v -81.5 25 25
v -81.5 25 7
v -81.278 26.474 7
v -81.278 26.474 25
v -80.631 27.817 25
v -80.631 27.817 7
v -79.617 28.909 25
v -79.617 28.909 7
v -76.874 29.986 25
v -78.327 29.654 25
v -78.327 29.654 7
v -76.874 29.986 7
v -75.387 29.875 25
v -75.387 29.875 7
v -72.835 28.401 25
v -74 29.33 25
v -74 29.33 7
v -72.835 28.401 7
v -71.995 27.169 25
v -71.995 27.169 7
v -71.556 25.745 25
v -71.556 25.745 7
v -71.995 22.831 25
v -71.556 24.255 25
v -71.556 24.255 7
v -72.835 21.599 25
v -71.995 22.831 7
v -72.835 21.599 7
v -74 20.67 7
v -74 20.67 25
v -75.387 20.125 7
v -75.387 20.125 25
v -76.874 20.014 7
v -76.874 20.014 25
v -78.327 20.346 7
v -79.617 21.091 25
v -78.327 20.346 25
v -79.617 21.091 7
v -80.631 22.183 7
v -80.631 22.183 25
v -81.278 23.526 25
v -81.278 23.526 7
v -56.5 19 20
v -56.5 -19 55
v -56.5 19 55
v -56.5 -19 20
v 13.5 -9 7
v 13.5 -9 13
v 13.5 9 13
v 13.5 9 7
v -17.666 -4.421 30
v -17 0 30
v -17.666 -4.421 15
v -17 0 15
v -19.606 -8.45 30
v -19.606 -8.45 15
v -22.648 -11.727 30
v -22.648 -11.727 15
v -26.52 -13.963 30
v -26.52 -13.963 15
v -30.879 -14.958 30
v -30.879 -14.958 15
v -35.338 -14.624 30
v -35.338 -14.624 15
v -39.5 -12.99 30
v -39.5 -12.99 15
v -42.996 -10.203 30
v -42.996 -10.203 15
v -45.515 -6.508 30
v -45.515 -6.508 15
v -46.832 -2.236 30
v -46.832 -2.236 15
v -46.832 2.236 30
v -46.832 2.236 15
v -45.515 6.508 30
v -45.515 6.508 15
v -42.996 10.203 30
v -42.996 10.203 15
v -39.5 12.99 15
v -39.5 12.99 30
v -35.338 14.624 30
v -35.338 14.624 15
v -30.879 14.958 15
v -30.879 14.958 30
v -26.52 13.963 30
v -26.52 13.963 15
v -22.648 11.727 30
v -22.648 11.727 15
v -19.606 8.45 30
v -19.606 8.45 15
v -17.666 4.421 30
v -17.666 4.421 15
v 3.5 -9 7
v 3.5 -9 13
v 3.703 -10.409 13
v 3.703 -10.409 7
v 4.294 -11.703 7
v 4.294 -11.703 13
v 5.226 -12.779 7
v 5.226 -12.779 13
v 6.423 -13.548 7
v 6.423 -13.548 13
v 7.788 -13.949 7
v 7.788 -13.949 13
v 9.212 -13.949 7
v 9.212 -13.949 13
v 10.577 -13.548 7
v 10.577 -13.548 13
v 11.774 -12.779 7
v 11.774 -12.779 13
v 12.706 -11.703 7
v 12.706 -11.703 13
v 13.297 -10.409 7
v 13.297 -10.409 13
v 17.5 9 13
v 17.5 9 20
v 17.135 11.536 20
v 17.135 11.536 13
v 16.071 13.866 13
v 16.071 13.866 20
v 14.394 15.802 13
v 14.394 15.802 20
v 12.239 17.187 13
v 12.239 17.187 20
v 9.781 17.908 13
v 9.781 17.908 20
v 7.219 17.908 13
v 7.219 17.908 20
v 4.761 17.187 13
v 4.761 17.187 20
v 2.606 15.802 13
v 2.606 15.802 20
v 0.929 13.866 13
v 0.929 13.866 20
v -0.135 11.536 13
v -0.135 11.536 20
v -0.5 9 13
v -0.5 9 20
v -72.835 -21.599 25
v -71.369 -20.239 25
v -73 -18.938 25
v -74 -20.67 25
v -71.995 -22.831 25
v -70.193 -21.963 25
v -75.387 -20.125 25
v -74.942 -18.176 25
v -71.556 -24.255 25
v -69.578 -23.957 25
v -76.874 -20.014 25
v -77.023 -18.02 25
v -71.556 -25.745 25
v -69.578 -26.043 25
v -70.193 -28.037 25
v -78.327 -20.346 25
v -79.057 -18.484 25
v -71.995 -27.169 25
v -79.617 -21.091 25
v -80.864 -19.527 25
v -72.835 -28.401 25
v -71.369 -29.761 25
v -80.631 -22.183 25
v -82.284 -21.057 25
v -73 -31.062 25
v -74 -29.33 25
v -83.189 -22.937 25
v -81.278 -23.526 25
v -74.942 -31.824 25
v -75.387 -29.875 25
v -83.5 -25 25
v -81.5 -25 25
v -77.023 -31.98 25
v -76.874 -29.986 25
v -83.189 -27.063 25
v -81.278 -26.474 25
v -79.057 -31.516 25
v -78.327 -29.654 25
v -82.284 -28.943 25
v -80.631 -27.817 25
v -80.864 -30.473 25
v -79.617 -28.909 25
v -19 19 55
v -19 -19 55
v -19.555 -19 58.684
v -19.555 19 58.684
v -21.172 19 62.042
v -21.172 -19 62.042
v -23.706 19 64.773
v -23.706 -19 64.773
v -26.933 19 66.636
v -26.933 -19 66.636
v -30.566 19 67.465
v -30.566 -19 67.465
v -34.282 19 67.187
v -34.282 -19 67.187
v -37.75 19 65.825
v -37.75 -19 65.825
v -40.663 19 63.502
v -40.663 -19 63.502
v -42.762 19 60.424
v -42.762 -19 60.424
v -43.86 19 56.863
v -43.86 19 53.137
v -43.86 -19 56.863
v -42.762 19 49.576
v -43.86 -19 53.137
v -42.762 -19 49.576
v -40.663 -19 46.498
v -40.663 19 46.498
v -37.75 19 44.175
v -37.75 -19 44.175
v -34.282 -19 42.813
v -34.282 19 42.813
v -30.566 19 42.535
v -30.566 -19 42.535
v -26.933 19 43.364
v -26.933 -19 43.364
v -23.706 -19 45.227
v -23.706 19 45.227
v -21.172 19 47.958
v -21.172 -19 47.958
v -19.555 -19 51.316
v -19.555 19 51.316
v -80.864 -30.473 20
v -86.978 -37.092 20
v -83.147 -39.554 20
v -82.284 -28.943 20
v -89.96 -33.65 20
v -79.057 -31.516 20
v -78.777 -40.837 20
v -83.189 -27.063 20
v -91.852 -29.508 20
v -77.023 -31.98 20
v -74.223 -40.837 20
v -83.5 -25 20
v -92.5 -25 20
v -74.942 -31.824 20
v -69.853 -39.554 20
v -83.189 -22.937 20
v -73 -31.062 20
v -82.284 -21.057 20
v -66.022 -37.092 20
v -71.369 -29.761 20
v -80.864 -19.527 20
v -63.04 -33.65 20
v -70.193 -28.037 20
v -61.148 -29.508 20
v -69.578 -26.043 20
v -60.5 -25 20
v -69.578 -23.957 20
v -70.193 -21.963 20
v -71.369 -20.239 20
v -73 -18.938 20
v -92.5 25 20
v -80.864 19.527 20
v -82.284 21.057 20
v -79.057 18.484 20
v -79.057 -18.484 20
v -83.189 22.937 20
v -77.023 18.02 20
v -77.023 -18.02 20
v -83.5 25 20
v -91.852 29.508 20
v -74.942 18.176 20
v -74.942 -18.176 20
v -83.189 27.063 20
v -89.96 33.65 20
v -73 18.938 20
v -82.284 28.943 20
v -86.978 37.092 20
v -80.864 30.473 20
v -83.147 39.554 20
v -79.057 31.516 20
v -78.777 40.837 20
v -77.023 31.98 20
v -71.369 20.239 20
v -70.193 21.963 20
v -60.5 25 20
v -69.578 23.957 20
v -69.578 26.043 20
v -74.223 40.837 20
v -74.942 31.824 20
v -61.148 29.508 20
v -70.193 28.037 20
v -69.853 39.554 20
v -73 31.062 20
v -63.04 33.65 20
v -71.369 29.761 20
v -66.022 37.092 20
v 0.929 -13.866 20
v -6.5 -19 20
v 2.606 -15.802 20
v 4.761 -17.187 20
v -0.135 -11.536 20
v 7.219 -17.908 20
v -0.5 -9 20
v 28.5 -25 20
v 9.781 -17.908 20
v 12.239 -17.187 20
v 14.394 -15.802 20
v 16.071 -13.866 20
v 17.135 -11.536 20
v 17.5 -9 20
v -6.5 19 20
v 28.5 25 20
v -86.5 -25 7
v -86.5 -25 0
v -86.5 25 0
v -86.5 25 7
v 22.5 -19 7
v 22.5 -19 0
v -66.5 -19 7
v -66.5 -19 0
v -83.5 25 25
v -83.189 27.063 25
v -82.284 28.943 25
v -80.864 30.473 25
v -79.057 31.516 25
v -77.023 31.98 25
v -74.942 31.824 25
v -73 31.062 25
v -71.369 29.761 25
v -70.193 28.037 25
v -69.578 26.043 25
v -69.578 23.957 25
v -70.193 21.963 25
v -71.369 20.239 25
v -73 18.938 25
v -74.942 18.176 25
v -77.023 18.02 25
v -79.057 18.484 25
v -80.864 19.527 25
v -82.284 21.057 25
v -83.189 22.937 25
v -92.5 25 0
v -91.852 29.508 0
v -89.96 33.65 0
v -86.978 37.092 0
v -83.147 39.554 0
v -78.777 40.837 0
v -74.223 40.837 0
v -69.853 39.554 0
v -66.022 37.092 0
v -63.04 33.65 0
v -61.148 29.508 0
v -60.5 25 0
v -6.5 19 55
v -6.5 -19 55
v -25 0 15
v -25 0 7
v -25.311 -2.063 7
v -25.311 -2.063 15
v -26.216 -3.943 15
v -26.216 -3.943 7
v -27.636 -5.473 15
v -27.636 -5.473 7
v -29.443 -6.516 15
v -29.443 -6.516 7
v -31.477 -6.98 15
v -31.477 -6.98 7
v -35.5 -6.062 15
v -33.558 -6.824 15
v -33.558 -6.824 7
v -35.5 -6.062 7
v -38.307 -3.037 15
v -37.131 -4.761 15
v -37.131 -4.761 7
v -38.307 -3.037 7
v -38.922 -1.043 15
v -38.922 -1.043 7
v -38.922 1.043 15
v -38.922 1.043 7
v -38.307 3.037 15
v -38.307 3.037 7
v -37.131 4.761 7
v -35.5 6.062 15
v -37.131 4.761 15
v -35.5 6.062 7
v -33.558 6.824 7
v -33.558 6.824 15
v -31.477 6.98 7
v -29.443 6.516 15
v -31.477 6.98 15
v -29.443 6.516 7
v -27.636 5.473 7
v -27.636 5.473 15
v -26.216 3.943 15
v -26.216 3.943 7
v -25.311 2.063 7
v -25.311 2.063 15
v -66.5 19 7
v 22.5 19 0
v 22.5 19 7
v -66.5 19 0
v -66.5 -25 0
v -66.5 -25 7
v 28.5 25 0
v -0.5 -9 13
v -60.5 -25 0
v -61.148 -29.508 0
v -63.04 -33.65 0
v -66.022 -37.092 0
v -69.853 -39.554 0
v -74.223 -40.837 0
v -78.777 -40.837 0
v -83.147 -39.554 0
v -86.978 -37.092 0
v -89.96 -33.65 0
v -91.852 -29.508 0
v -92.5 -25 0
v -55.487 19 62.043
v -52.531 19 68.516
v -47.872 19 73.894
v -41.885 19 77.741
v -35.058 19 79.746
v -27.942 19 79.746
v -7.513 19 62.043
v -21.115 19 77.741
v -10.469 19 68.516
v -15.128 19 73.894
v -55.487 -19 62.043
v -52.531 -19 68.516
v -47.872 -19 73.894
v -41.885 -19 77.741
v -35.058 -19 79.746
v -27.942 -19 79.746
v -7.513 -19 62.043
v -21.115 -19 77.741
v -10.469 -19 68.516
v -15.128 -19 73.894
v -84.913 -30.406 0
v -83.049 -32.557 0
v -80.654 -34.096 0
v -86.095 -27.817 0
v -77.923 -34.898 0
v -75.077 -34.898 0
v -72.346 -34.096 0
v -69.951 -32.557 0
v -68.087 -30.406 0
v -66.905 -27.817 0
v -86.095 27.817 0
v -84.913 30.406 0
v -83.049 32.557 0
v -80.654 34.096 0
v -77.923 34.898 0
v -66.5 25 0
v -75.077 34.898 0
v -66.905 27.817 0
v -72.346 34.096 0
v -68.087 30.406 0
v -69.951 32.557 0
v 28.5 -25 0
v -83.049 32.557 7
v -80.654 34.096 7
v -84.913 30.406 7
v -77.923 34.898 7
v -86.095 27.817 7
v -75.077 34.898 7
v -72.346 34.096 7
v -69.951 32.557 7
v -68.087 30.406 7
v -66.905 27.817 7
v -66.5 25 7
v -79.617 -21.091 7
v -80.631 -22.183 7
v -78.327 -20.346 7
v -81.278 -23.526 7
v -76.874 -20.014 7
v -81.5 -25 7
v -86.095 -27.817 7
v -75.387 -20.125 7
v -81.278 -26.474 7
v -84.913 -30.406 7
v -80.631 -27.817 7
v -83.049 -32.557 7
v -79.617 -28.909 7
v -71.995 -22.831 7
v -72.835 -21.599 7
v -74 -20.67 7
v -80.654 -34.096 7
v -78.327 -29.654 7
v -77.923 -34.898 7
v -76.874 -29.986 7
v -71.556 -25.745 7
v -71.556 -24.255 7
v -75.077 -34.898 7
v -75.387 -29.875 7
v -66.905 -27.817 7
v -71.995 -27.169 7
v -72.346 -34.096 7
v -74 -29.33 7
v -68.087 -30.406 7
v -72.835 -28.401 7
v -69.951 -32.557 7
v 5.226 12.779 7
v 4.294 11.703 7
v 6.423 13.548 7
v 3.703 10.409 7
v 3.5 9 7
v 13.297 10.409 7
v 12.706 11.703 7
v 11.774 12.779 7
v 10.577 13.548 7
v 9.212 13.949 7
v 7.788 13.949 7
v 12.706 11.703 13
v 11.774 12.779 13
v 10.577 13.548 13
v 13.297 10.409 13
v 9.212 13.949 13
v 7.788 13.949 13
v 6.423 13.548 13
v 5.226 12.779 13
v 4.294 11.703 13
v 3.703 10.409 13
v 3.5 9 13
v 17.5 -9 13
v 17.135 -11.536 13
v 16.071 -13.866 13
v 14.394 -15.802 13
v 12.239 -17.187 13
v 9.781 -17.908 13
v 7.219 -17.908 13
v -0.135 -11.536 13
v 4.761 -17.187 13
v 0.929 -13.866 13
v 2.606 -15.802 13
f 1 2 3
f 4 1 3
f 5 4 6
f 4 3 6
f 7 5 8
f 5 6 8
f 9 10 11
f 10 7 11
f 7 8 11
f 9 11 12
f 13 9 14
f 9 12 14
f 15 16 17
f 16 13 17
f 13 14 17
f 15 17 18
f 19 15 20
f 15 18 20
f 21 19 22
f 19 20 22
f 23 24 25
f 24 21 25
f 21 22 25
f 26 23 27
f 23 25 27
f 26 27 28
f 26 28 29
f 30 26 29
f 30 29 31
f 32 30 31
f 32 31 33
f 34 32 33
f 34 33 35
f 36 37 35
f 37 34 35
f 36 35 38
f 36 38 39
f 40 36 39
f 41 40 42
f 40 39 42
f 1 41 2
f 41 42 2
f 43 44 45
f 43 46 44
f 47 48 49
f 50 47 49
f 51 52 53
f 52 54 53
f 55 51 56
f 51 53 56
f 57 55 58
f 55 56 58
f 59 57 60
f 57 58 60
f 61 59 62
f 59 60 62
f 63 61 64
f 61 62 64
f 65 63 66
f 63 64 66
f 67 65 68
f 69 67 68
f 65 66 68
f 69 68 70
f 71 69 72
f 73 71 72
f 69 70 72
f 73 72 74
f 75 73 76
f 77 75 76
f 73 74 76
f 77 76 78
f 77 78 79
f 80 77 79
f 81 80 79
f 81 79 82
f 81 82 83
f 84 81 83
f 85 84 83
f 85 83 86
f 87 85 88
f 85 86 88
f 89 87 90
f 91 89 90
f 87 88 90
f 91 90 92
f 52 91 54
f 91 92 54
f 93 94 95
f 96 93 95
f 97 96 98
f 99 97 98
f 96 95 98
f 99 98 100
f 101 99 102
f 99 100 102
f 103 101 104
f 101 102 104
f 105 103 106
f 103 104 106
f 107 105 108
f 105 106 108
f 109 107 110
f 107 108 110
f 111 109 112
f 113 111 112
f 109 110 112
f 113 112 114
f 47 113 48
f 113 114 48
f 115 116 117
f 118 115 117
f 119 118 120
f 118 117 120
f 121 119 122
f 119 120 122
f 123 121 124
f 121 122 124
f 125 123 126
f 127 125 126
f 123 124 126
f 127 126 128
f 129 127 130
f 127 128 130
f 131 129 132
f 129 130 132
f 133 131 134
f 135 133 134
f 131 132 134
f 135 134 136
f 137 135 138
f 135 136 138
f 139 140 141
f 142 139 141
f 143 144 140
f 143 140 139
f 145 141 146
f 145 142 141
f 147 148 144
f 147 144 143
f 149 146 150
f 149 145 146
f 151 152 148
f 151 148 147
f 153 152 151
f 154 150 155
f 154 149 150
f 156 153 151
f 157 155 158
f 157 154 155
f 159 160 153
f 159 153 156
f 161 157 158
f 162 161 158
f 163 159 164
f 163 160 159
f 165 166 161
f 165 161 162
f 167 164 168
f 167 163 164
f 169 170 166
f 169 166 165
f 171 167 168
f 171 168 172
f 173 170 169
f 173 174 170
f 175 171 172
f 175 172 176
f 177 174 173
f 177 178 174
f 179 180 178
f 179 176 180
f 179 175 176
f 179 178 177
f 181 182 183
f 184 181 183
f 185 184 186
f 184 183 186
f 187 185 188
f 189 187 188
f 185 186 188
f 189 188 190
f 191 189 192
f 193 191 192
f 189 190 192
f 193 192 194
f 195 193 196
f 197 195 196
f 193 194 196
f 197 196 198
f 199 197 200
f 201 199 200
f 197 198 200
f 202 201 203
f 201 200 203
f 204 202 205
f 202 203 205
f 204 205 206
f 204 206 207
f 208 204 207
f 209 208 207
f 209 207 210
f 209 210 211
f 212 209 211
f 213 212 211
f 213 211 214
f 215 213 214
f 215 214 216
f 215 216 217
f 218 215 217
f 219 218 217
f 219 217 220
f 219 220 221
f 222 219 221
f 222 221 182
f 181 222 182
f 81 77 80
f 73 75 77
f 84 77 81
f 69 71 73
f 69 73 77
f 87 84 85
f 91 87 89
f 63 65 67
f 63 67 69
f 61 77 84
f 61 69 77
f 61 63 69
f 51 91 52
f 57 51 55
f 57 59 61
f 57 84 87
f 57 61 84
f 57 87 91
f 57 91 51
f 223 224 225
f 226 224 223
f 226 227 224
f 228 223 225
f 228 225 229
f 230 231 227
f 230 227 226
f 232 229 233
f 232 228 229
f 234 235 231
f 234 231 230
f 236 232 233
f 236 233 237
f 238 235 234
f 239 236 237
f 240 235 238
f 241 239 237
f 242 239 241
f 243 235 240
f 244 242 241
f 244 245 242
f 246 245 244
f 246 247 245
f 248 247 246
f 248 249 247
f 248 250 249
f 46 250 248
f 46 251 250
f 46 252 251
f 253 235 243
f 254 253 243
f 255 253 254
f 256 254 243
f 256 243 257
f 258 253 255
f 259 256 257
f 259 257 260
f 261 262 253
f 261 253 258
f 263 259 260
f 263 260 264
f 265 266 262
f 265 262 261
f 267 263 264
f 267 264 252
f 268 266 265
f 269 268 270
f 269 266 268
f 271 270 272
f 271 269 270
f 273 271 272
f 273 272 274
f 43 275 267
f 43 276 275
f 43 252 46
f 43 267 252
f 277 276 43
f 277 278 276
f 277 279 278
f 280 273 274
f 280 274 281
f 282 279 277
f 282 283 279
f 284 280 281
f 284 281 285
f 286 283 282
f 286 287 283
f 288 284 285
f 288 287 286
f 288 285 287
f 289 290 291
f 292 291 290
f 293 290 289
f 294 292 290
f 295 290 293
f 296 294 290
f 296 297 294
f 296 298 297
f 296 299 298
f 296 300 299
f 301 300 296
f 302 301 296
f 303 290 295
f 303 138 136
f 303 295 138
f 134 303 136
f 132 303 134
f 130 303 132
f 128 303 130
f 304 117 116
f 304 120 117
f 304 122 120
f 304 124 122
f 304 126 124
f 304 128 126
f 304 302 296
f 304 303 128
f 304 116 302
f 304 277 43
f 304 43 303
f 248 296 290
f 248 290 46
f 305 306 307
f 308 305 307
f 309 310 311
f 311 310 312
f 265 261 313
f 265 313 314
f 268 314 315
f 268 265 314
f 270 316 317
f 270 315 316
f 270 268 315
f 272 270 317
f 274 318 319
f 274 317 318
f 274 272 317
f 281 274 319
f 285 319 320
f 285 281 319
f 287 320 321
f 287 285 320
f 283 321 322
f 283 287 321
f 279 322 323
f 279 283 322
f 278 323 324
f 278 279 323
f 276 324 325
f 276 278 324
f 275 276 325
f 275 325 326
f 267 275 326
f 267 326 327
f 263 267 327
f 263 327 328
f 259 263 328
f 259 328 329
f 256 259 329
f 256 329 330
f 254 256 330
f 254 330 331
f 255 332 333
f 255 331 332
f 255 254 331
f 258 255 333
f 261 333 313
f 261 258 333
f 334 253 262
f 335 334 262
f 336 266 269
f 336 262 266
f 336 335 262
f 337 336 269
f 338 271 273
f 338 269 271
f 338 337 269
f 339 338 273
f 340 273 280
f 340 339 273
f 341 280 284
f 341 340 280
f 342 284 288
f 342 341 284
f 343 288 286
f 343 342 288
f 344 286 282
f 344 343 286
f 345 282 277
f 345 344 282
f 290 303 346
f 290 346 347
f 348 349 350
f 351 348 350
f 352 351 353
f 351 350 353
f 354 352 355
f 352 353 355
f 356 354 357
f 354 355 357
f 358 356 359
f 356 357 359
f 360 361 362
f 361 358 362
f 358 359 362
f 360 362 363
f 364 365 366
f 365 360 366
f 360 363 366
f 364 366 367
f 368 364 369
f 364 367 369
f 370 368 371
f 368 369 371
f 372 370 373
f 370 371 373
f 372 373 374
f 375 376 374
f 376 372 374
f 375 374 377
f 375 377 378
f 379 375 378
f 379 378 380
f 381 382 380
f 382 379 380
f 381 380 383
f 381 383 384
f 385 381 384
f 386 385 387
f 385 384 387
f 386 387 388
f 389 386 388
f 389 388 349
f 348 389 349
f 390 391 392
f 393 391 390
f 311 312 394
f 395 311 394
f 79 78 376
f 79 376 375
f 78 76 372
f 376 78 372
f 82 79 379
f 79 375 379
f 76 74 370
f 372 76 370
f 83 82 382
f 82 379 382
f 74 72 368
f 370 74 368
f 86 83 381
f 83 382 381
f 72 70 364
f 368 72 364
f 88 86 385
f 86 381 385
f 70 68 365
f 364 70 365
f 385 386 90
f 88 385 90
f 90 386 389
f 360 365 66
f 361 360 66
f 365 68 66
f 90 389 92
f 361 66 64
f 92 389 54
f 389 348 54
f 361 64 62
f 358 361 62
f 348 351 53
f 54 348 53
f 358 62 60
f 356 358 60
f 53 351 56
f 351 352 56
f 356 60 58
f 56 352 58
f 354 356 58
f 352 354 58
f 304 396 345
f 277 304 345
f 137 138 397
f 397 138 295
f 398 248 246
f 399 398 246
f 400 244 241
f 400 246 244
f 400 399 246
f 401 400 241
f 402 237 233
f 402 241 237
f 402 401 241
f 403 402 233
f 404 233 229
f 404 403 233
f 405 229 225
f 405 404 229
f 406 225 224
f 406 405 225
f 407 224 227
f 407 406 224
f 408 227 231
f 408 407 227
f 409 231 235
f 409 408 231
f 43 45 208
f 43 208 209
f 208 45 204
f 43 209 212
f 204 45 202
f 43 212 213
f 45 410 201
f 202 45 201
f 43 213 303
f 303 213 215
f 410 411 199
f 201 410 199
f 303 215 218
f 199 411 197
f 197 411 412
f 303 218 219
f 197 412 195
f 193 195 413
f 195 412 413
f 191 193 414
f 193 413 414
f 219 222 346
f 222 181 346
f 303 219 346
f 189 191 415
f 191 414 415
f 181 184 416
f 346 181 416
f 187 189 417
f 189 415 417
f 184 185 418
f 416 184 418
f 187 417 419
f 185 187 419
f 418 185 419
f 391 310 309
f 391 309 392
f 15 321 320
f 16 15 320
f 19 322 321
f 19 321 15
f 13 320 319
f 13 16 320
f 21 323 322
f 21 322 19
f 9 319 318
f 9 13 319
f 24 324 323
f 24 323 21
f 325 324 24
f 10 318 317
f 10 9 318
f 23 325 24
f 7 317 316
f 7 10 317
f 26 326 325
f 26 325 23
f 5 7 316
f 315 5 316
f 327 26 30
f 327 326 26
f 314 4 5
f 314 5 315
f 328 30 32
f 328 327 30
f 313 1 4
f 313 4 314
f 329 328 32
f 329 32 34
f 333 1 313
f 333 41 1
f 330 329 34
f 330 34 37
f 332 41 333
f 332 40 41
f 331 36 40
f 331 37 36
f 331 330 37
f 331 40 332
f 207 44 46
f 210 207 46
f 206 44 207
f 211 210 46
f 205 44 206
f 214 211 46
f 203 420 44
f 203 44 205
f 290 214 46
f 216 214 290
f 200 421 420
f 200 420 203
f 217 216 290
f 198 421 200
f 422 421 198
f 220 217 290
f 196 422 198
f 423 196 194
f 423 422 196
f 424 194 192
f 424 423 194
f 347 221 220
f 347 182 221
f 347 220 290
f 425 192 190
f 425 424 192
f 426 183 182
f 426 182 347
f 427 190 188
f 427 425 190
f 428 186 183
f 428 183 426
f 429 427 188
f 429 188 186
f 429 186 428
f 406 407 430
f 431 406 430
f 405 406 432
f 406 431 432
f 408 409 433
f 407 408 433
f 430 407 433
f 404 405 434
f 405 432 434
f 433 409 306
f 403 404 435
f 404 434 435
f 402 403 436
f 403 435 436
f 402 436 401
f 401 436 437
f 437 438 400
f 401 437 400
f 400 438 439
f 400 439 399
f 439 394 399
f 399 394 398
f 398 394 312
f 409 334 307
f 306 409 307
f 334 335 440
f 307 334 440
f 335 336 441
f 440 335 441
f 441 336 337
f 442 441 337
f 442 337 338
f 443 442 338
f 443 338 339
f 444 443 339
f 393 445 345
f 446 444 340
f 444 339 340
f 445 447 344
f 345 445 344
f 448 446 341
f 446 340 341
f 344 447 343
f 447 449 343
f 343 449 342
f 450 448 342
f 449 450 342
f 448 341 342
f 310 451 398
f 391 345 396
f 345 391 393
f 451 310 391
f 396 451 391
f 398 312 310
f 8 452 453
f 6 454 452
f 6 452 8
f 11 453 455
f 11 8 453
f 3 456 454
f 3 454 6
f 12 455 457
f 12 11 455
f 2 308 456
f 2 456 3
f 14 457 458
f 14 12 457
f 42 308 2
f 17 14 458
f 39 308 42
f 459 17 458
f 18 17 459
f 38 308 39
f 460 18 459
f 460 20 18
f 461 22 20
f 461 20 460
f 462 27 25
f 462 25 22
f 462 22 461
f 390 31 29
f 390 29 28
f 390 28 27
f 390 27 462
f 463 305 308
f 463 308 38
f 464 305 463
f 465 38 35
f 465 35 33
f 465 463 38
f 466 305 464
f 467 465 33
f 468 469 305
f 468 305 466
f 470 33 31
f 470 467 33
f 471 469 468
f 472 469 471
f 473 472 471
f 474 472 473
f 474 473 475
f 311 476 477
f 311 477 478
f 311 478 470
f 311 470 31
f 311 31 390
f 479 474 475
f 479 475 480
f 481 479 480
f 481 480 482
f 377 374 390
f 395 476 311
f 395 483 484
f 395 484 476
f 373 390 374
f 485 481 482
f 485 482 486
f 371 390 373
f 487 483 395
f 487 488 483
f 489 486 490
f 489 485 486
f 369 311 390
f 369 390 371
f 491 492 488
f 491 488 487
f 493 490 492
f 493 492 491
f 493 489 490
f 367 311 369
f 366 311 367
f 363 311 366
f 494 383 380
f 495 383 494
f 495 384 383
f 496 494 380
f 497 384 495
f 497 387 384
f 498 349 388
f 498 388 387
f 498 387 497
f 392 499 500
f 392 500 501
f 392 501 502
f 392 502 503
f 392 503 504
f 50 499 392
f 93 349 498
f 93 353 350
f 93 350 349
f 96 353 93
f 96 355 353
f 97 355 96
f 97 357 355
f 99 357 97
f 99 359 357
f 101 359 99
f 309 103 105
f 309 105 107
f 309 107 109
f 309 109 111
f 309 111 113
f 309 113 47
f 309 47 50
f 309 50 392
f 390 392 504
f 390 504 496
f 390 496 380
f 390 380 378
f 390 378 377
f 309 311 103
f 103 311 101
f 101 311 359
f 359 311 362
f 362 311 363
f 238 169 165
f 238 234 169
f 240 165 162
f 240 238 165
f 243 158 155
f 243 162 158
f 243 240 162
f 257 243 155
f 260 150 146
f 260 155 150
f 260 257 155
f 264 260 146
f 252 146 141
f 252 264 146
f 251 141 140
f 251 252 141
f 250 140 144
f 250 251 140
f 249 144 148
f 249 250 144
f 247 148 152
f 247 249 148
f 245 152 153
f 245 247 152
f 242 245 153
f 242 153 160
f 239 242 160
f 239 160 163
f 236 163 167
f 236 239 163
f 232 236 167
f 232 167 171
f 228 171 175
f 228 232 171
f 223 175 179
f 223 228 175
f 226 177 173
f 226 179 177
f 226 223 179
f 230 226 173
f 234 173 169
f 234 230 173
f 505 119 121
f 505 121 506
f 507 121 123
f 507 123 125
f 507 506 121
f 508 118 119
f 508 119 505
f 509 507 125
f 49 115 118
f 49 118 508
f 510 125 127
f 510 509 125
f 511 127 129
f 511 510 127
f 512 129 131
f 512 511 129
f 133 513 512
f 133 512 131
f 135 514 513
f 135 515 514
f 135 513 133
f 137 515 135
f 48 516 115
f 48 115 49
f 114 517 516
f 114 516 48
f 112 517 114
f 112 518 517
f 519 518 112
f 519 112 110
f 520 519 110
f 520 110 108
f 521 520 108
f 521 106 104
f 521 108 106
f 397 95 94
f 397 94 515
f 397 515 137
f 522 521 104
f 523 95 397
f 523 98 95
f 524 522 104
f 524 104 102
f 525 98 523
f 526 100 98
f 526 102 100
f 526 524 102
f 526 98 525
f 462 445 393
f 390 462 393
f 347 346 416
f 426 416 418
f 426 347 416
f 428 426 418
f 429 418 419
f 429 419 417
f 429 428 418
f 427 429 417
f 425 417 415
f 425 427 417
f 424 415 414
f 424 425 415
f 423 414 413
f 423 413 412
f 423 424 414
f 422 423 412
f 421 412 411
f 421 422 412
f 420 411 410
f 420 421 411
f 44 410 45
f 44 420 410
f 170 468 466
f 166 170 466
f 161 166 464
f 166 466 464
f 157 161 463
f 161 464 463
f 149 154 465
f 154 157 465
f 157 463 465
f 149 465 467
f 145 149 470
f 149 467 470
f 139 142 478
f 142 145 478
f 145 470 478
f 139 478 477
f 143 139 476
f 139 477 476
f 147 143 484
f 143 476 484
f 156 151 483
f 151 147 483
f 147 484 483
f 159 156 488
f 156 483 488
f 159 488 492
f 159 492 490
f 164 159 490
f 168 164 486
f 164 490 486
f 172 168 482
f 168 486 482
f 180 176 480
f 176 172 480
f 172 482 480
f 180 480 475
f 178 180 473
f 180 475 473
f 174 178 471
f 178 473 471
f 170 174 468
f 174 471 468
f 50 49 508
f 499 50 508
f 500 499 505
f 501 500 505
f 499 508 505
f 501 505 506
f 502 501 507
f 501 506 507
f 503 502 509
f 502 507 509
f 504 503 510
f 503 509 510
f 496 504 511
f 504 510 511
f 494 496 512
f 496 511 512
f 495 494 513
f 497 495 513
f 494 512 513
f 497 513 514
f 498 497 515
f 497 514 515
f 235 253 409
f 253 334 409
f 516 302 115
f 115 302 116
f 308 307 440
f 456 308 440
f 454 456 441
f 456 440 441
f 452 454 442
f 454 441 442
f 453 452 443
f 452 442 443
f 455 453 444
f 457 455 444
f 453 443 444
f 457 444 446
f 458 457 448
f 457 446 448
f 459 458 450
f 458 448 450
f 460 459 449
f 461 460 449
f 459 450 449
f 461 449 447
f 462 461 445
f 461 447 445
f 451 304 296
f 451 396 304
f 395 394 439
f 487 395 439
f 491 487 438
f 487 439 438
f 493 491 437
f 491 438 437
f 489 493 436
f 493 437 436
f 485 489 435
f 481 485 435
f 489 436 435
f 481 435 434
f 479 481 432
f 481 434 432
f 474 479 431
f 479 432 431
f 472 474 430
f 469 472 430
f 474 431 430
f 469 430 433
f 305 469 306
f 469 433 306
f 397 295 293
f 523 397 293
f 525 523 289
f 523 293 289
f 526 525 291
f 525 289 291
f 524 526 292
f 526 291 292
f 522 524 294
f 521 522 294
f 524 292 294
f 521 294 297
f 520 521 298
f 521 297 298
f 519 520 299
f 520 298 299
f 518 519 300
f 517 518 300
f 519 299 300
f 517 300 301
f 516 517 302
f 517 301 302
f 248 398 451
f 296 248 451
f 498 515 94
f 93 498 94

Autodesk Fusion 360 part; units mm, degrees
sketch "Sketch1" plane through (0, 0, 0) normal (0, 0, 1) x (1, 0, 0)
  line L0 (28.5, 25) -> (-60.5, 25)
  line L1 (-60.5, -25) -> (28.5, -25)
  line L2 (60.5, 25) -> (-60.5, -25) construction
  line L3 (-60.5, 25) -> (60.5, -25) construction
  line L4 (-92.5, 25) -> (-92.5, -25)
  arc A0 (-92.5, -25) -> (-60.5, -25) centre (-76.5, -25) ccw
  arc A1 (-60.5, 25) -> (-92.5, 25) centre (-76.5, 25) ccw
  line L5 (-76.5, 25) -> (-76.5, -25) construction
  line L6 (28.5, 25) -> (28.5, -25)
  line L7 (28.5, 25) -> (28.5, -25)
  line L8 (-60.5, 25) -> (28.5, 25)
  dimension "d1" = 121
  dimension "d2" = 50
  dimension "d3" = 16
  dimension "d4" = 32
  dimension "d5" = 121
extrude "Extrude1" add sketch "Sketch1" along normal blind 20
sketch "Sketch2" plane through (0, 0, 20) normal (0, 0, 1) x (-1, 0, 0)
  line L0 (92.5, -25) -> (92.5, 25)
  arc A0 (92.5, 25) -> (60.5, 25) centre (76.5, 25) ccw
  line L1 (60.5, 25) -> (-28.5, 25)
  line L2 (-28.5, 25) -> (-28.5, -25)
  line L3 (-28.5, -25) -> (60.5, -25)
  arc A1 (60.5, -25) -> (92.5, -25) centre (76.5, -25) ccw
  circle A2 centre (76.5, -25) radius 7
  circle A3 centre (76.5, 25) radius 7
  circle A4 centre (76.5, -25) radius 5
  circle A5 centre (76.5, 25) radius 5
  dimension "d8" = 14
  dimension "d9" = 14
  dimension "d10" = 10
  dimension "d11" = 10
extrude "Extrude2" cut sketch "Sketch2" against normal blind 45 contours A4 | A5
sketch "Sketch3" plane through (0, 0, 20) normal (0, 0, 1) x (-1, 0, 0)
  circle A0 centre (76.5, 25) radius 5
  circle A1 centre (76.5, -25) radius 5
  line L0 (92.5, -25) -> (92.5, 25)
  arc A2 (92.5, 25) -> (60.5, 25) centre (76.5, 25) ccw
  line L1 (60.5, 25) -> (-28.5, 25)
  line L2 (-28.5, 25) -> (-28.5, -25)
  line L3 (-28.5, -25) -> (60.5, -25)
  arc A3 (60.5, -25) -> (92.5, -25) centre (76.5, -25) ccw
  circle A4 centre (76.5, -25) radius 7
  circle A5 centre (76.5, 25) radius 7
  dimension "d14" = 14
  dimension "d15" = 14
extrude "Extrude3" add sketch "Sketch3" along normal blind 5 contours A4 | A5
sketch "Sketch4" plane through (0, 0, 0) normal (0, 0, -1) x (1, 0, 0)
  circle A0 centre (-76.5, 25) radius 5
  circle A1 centre (-76.5, -25) radius 5
  line L0 (-92.5, 25) -> (-92.5, -25)
  arc A2 (-92.5, -25) -> (-60.5, -25) centre (-76.5, -25) ccw
  line L1 (-60.5, -25) -> (28.5, -25)
  line L2 (28.5, -25) -> (28.5, 25)
  line L3 (28.5, 25) -> (-60.5, 25)
  arc A3 (-60.5, 25) -> (-92.5, 25) centre (-76.5, 25) ccw
  line L4 (-86.5, 25) -> (-86.5, -25)
  arc A4 (-86.5, -25) -> (-66.5, -25) centre (-76.5, -25) ccw
  arc A5 (-66.5, 25) -> (-86.5, 25) centre (-76.5, 25) ccw
  line L5 (-76.5, 25) -> (-76.5, -25) construction
  line L6 (-30, 25) -> (-30, 19) construction
  line L7 (28.5, 0) -> (22.5, 0) construction
  line L8 (22.5, 19) -> (22.5, 0)
  line L9 (22.5, 19) -> (-66.5, 19)
  line L10 (22.5, 0) -> (22.5, -19)
  line L11 (22.5, -19) -> (-66.5, -19)
  line L12 (-66.5, -25) -> (-66.5, -19)
  line L13 (-66.5, 19) -> (-66.5, 25)
  dimension "d18" = 20
  dimension "d19" = 6
  dimension "d20" = 6
  dimension "d21" = 19
extrude "Extrude4" cut sketch "Sketch4" against normal blind 7 contours L4 A4 A5 L8 L9 L10 L11 L12 L13
sketch "Sketch5" plane through (0, 0, 20) normal (0, 0, 1) x (-1, 0, 0)
  circle A0 centre (76.5, 25) radius 7
  circle A1 centre (76.5, -25) radius 7
  line L0 (92.5, -25) -> (92.5, 25)
  arc A2 (92.5, 25) -> (60.5, 25) centre (76.5, 25) ccw
  line L1 (60.5, 25) -> (-28.5, 25)
  line L2 (-28.5, 25) -> (-28.5, -25)
  line L3 (-28.5, -25) -> (60.5, -25)
  arc A3 (60.5, -25) -> (92.5, -25) centre (76.5, -25) ccw
  line L4 (-28.5, 0) -> (-28.5, -9)
  line L5 (-28.5, 0) -> (-28.5, 9)
  line L6 (-28.5, -25) -> (-8.5, -25)
  line L7 (-8.5, -9) -> (-8.5, 9)
  line L8 (0.5, -9) -> (0.5, 9)
  arc A4 (0.5, 9) -> (-17.5, 9) centre (-8.5, 9) ccw
  line L9 (-17.5, 9) -> (-17.5, -9)
  arc A5 (-17.5, -9) -> (0.5, -9) centre (-8.5, -9) ccw
  line L10 (-8.5, -9) -> (-8.5, 9) construction
  line L11 (-3.5, -9) -> (-3.5, 9)
  arc A6 (-3.5, 9) -> (-13.5, 9) centre (-8.5, 9) ccw
  line L12 (-13.5, 9) -> (-13.5, -9)
  arc A7 (-13.5, -9) -> (-3.5, -9) centre (-8.5, -9) ccw
  line L13 (-8.5, -9) -> (-8.5, 9) construction
  dimension "d24" = 9
  dimension "d25" = 9
  dimension "d26" = 20
  dimension "d27" = 18
  dimension "d28" = 10
extrude "Extrude5" cut sketch "Sketch5" against normal blind 7 contours L8 A4 L9 A5
extrude "Extrude6" cut 1 faces at (10.1667, -3, 20) along direction (0, 0, -1) blind 55
sketch "Sketch6" plane through (0, 0, 20) normal (0, 0, 1) x (-1, 0, 0)
  line L0 (92.5, -25) -> (92.5, 25)
  arc A0 (92.5, 25) -> (60.5, 25) centre (76.5, 25) ccw
  line L1 (60.5, 25) -> (-28.5, 25)
  line L2 (-28.5, 25) -> (-28.5, -25)
  line L3 (-28.5, -25) -> (60.5, -25)
  arc A1 (60.5, -25) -> (92.5, -25) centre (76.5, -25) ccw
  circle A2 centre (76.5, -25) radius 7
  circle A3 centre (76.5, 25) radius 7
  line L4 (0.5, 9) -> (0.5, -9)
  arc A4 (-17.5, -9) -> (0.5, -9) centre (-8.5, -9) ccw
  line L5 (-17.5, -9) -> (-17.5, 9)
  arc A5 (0.5, 9) -> (-17.5, 9) centre (-8.5, 9) ccw
sketch "Sketch7" plane through (0, 0, 20) normal (0, 0, 1) x (-1, 0, 0)
  line L0 (-28.5, -25) -> (31.5, -25)
  dimension "d33" = 60
sketch "Sketch8" plane through (0, 0, 20) normal (0, 0, 1) x (-1, 0, 0)
  line L0 (31.5, -25) -> (31.5, 0)
  arc A0 (-13.5, -9) -> (-3.5, -9) centre (-8.5, -9) ccw
  line L1 (-3.5, -9) -> (-3.5, 9)
  arc A1 (-3.5, 9) -> (-13.5, 9) centre (-8.5, 9) ccw
  line L2 (-13.5, 9) -> (-13.5, -9)
  circle A2 centre (76.5, 25) radius 5
  circle A3 centre (76.5, -25) radius 5
  line L3 (-22.5, 19) -> (66.5, 19)
  line L4 (66.5, 19) -> (66.5, 25)
  arc A4 (86.5, 25) -> (66.5, 25) centre (76.5, 25) ccw
  line L5 (86.5, 25) -> (86.5, -25)
  arc A5 (66.5, -25) -> (86.5, -25) centre (76.5, -25) ccw
  line L6 (66.5, -25) -> (66.5, -19)
  line L7 (66.5, -19) -> (-22.5, -19)
  line L8 (-22.5, -19) -> (-22.5, 19)
  line L9 (31.5, -19) -> (56.5, -19)
  line L10 (31.5, 19) -> (6.5, 19)
  line L11 (6.5, 19) -> (56.5, 19)
  line L12 (56.5, 19) -> (56.5, -19)
  line L13 (56.5, -19) -> (6.5, -19)
  line L14 (6.5, -19) -> (6.5, 19)
  dimension "d34" = 25
  dimension "d35" = 25
extrude "Extrude7" add sketch "Sketch8" along normal blind 35 contours L3 L7 L9 L10 L11 L12 L13 L14
sketch "Sketch9" plane through (0, -19, 0) normal (0, -1, 0) x (1, 0, 0)
  line L0 (-56.5, 20) -> (-6.5, 20)
  line L1 (-6.5, 20) -> (-6.5, 55)
  line L2 (-6.5, 55) -> (-56.5, 55)
  line L3 (-56.5, 55) -> (-56.5, 20)
  circle A0 centre (-31.5, 55) radius 25
  dimension "d38" = 50
extrude "Extrude8" add sketch "Sketch9" against normal blind 38 contours L2 A0 picked at (-35.1673, 71.0673)
sketch "Sketch10" plane through (0, -19, 0) normal (0, -1, 0) x (1, 0, 0)
  line L0 (-56.5, 20) -> (-6.5, 20)
  line L1 (-6.5, 20) -> (-6.5, 55)
  arc A0 (-6.5, 55) -> (-56.5, 55) centre (-31.5, 55) ccw
  line L2 (-56.5, 55) -> (-56.5, 20)
  circle A1 centre (-31.5, 55) radius 12.5
  dimension "d41" = 25
extrude "Extrude9" cut sketch "Sketch10" against normal blind 70 contours A1
sketch "Sketch11" plane through (0, 0, 7) normal (0, 0, -1) x (1, 0, 0)
  arc A0 (3.5, -9) -> (13.5, -9) centre (8.5, -9) ccw
  line L0 (3.5, -9) -> (3.5, 9)
  arc A1 (13.5, 9) -> (3.5, 9) centre (8.5, 9) ccw
  line L1 (13.5, 9) -> (13.5, -9)
  circle A2 centre (-76.5, 25) radius 5
  circle A3 centre (-76.5, -25) radius 5
  line L2 (22.5, 19) -> (-66.5, 19)
  line L3 (-66.5, 19) -> (-66.5, 25)
  arc A4 (-66.5, 25) -> (-86.5, 25) centre (-76.5, 25) ccw
  line L4 (-86.5, 25) -> (-86.5, -25)
  arc A5 (-86.5, -25) -> (-66.5, -25) centre (-76.5, -25) ccw
  line L5 (-66.5, -25) -> (-66.5, -19)
  line L6 (-66.5, -19) -> (22.5, -19)
  line L7 (22.5, -19) -> (22.5, 19)
  line L8 (-66.5, 25) -> (-66.5, 19)
  line L9 (-66.5, 19) -> (22.5, 19)
  line L10 (22.5, 19) -> (22.5, -19)
  line L11 (22.5, -19) -> (-66.5, -19)
  line L12 (-66.5, -19) -> (-66.5, -25)
  arc A6 (-86.5, -25) -> (-66.5, -25) centre (-76.5, -25) ccw
  line L13 (-86.5, -25) -> (-86.5, 25)
  arc A7 (-66.5, 25) -> (-86.5, 25) centre (-76.5, 25) ccw
  line L14 (-92.5, 25) -> (-92.5, -25)
  arc A8 (-92.5, -25) -> (-60.5, -25) centre (-76.5, -25) ccw
  line L15 (-60.5, -25) -> (28.5, -25)
  line L16 (28.5, -25) -> (28.5, 25)
  line L17 (28.5, 25) -> (-60.5, 25)
  arc A9 (-60.5, 25) -> (-92.5, 25) centre (-76.5, 25) ccw
  line L18 (-92.5, 0) -> (-32, 0)
  circle A10 centre (-32, 0) radius 7
  dimension "d44" = 60.5
  dimension "d45" = 14
extrude "Extrude10" cut sketch "Sketch11" against normal blind 8 contours A10
sketch "Sketch12" plane through (0, 0, 15) normal (0, 0, -1) x (1, 0, 0)
  circle A0 centre (-32, 0) radius 7
  circle A1 centre (-32, 0) radius 15
  dimension "d48" = 30
extrude "Extrude11" cut sketch "Sketch12" against normal blind 15
extrude "Extrude12" cut 1 faces at (-31.572, 1.6695, 15) along direction (0, 0, 1) blind 15
equation "d2 = 0 mm + 50 mm"
equation "d44 = ( 121 / 2 ) * 1 mm"
